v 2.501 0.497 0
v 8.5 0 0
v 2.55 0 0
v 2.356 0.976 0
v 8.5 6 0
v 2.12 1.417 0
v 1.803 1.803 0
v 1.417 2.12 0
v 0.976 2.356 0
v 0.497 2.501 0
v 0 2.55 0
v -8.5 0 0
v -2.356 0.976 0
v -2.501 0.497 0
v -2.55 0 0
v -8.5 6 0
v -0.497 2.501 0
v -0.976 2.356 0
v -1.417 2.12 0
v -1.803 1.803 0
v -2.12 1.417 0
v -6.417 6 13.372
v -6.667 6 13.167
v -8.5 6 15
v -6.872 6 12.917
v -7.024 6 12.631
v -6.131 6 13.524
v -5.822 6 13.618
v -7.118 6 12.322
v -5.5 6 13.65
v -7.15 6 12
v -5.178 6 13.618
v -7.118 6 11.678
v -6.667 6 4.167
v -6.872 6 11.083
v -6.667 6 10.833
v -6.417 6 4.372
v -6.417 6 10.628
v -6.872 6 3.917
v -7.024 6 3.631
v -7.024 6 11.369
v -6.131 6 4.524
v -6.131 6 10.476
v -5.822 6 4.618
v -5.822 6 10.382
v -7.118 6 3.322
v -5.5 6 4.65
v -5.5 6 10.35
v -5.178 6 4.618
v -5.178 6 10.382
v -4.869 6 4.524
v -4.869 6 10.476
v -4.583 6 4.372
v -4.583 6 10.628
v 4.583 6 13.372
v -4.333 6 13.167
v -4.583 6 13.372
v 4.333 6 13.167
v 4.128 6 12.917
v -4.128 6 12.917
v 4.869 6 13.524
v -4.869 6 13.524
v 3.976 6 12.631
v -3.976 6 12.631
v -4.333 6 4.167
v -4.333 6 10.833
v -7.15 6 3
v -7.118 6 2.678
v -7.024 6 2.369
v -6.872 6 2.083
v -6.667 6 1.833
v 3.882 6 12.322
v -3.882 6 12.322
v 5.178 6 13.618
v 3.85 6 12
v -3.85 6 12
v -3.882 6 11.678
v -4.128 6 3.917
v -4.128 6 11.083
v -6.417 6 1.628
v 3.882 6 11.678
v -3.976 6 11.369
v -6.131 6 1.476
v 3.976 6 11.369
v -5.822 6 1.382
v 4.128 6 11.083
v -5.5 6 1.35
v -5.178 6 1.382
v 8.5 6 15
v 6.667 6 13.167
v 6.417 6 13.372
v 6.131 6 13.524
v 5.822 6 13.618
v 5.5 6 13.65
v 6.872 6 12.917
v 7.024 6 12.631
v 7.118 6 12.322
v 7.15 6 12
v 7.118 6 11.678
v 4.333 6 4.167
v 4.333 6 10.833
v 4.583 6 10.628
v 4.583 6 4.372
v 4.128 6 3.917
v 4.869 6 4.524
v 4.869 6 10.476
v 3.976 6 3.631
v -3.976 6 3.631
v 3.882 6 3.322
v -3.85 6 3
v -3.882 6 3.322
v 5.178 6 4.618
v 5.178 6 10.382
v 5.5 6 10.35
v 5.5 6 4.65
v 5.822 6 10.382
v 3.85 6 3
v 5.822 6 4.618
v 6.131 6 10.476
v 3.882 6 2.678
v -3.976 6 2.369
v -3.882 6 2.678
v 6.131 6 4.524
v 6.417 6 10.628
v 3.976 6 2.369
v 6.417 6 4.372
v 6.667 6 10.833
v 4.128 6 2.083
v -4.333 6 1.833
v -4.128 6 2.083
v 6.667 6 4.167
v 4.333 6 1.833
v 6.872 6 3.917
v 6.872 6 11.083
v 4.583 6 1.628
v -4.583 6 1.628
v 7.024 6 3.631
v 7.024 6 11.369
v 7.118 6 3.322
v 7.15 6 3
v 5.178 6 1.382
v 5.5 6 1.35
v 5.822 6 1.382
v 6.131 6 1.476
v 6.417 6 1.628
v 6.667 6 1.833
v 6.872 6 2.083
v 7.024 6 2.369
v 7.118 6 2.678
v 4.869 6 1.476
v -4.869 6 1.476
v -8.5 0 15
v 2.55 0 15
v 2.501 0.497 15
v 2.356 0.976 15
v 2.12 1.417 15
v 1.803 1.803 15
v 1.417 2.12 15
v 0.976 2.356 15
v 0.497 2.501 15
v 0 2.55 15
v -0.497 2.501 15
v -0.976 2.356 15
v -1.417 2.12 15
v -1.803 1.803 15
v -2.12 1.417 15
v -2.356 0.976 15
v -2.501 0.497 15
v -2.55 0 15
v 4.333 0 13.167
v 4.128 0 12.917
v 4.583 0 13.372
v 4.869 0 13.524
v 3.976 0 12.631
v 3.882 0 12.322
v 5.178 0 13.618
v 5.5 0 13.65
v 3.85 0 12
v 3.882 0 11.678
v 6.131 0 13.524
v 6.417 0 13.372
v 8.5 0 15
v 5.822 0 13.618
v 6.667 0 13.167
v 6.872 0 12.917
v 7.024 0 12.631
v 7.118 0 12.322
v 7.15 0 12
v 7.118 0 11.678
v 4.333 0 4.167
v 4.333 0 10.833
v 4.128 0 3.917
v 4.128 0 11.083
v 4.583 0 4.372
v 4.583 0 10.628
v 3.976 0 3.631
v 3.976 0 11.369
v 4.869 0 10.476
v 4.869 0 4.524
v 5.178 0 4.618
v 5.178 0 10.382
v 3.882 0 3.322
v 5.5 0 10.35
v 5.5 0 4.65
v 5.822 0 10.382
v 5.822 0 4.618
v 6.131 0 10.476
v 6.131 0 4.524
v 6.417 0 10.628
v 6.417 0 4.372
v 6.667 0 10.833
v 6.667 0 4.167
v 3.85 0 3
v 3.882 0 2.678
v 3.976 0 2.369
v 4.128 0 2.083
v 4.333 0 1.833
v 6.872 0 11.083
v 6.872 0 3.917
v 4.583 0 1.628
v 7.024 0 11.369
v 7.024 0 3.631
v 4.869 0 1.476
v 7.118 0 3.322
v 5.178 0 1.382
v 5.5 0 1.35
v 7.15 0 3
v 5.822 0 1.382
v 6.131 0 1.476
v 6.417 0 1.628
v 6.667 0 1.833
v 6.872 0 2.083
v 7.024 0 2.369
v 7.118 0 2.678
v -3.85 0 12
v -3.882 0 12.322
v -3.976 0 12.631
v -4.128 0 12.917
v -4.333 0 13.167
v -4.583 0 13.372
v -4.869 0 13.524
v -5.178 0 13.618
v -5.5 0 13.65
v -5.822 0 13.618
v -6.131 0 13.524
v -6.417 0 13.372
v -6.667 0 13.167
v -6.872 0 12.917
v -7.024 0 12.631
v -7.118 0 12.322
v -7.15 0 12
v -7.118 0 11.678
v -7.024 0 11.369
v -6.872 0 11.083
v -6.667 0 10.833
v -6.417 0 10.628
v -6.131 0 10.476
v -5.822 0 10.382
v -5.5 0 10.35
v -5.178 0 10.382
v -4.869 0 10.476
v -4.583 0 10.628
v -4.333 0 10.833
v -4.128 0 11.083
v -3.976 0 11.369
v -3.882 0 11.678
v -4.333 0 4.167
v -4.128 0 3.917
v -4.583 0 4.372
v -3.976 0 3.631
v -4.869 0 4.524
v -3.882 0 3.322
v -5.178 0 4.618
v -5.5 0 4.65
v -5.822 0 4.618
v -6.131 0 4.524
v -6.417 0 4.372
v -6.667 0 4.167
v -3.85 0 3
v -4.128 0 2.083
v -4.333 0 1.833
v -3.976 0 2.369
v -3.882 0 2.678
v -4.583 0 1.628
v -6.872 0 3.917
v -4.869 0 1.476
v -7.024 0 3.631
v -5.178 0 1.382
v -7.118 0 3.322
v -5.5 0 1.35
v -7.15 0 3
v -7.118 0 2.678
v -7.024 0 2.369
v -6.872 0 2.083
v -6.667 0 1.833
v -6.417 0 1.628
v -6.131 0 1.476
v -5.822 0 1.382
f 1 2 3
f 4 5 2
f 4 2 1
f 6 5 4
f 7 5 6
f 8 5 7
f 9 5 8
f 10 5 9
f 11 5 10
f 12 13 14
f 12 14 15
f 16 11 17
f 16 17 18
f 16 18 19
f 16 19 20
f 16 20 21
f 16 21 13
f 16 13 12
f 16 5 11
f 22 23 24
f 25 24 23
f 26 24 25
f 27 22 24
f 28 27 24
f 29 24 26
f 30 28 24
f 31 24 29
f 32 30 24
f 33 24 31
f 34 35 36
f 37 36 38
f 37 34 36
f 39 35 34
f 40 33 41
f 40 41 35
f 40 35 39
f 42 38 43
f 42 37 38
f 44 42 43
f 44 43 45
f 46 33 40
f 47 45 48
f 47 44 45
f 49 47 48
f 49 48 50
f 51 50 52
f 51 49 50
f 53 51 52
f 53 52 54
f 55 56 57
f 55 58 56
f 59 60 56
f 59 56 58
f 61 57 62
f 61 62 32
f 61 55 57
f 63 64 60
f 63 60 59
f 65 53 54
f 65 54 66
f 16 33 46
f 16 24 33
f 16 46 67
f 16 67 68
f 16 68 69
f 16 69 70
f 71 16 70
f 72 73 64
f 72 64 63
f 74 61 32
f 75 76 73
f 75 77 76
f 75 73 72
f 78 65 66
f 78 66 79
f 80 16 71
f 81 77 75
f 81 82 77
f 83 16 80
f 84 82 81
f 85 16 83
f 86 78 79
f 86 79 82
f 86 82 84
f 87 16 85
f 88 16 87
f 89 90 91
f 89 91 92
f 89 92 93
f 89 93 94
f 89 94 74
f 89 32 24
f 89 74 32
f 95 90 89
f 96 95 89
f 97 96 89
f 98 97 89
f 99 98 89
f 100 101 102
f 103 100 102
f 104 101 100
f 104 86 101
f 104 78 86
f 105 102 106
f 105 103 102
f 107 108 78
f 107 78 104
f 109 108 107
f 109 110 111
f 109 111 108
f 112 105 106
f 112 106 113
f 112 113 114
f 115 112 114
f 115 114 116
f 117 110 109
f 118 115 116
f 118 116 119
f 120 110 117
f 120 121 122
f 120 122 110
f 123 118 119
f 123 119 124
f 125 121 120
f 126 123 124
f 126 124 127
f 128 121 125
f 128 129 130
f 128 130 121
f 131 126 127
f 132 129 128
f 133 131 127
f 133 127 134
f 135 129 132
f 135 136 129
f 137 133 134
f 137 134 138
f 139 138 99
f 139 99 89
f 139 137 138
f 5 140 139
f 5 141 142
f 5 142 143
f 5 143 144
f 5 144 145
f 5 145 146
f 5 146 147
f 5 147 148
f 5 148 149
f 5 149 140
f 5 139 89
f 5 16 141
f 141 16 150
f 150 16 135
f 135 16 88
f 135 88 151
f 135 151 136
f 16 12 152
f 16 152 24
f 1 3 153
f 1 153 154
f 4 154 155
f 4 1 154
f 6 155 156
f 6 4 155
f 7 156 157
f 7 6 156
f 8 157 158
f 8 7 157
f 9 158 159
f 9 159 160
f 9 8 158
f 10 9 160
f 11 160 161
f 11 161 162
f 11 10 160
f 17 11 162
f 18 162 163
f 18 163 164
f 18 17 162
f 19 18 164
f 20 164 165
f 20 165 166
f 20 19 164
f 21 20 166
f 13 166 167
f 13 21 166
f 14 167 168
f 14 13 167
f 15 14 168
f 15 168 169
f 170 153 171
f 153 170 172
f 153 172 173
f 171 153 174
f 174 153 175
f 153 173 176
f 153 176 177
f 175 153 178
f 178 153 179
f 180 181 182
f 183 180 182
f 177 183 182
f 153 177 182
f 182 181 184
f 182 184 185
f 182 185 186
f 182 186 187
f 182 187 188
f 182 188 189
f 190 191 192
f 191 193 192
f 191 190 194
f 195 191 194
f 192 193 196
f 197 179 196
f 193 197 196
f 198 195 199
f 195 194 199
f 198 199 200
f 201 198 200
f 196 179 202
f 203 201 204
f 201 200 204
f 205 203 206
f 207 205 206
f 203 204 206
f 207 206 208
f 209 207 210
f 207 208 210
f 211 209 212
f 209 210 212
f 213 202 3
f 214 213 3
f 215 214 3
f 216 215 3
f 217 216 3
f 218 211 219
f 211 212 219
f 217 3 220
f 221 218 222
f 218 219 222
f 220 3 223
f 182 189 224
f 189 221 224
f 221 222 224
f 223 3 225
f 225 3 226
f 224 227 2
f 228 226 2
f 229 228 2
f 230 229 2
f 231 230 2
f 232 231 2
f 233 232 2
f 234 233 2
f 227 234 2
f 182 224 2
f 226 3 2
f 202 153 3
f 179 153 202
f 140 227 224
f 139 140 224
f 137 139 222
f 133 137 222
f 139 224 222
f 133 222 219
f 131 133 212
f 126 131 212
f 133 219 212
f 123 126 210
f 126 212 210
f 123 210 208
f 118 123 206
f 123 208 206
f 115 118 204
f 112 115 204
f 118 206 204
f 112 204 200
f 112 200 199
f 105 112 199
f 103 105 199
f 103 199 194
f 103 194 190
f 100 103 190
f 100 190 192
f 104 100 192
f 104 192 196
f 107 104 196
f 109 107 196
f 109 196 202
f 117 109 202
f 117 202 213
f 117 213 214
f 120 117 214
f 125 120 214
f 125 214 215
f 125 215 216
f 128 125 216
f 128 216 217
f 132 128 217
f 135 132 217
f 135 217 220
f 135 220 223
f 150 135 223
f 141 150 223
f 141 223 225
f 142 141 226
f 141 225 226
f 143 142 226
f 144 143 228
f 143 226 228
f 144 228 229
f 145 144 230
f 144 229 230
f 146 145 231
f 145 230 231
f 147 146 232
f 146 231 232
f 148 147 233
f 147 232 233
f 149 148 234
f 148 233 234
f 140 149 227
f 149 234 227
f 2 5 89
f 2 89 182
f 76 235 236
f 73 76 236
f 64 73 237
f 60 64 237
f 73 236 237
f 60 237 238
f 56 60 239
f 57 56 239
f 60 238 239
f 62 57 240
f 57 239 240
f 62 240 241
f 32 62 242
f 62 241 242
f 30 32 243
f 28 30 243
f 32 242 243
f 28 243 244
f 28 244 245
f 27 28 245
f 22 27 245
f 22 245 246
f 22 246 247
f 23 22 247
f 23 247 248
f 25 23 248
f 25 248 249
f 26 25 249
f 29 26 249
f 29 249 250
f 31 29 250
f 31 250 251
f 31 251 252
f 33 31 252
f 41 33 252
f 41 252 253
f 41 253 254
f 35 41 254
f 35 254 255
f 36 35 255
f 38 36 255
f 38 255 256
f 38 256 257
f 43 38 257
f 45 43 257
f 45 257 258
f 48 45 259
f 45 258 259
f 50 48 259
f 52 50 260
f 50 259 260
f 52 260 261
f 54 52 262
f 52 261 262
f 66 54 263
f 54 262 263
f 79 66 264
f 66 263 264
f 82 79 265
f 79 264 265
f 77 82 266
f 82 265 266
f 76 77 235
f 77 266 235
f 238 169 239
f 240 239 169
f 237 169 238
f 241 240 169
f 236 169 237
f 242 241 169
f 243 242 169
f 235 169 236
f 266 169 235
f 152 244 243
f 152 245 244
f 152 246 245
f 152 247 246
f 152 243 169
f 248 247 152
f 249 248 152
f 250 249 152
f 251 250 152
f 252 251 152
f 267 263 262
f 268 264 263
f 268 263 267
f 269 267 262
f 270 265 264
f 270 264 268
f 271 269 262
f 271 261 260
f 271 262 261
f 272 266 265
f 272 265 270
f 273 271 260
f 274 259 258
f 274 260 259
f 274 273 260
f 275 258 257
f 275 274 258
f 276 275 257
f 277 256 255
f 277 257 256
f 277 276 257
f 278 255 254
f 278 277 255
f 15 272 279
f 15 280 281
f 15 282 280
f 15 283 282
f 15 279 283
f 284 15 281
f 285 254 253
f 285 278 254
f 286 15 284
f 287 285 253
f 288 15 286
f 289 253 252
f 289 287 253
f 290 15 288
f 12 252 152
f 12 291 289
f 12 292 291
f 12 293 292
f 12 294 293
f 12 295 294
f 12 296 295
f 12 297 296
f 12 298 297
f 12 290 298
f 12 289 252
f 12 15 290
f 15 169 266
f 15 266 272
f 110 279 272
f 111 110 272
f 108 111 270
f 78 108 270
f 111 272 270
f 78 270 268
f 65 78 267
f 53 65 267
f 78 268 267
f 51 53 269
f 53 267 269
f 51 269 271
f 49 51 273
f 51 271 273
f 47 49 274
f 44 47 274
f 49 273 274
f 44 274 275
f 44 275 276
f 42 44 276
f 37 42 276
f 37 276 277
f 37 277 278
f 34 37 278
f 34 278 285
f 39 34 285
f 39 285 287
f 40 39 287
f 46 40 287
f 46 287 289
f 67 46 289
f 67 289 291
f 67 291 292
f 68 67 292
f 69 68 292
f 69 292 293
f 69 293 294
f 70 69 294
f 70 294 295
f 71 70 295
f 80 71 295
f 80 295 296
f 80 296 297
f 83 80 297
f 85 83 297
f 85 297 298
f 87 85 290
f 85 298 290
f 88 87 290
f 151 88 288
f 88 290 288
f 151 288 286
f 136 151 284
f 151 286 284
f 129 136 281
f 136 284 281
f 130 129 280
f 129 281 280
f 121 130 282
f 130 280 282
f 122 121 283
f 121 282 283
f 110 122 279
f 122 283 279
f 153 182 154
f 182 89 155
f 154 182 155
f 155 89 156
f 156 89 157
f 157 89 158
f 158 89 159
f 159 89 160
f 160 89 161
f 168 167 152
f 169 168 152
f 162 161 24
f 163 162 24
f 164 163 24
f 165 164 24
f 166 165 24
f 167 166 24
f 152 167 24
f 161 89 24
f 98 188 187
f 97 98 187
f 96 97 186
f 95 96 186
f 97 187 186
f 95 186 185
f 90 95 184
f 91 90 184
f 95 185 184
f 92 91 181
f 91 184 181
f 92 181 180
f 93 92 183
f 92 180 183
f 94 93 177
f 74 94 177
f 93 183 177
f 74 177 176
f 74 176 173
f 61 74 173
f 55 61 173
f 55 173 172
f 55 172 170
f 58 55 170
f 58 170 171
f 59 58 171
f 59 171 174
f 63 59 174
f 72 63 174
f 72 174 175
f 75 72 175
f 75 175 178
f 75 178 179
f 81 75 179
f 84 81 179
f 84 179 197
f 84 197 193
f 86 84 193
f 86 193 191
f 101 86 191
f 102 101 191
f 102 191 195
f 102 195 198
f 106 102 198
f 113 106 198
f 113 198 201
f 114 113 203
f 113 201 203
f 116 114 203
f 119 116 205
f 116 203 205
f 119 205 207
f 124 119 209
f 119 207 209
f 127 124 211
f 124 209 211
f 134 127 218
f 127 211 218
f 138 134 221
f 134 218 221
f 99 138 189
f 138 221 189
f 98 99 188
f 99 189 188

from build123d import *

# Parameters (mm, degrees)
PAD_DEPTH    = 15
SKETCH001_R  = 1.65
POCKET_DEPTH = 6.001


with BuildPart() as part:
    # Sketch → Pad (new body)
    with BuildSketch(Plane.XY):
        with BuildLine():
            ThreePointArc((2.55, 0), (0, 2.55), (-2.55, 0))
            Line((-2.55, 0), (-8.5, 0))
            Line((-8.5, 0), (-8.5, 6))
            Line((-8.5, 6), (8.5, 6))
            Line((8.5, 6), (8.5, 0))
            Line((2.55, 0), (8.5, 0))
        make_face()
    extrude(amount=PAD_DEPTH)

    # Sketch001 → Pocket (cut, through all)
    with BuildSketch(Plane.XZ):
        with Locations((-5.5, 3)):
            Circle(SKETCH001_R)
        with Locations((-5.5, 12)):
            Circle(SKETCH001_R)
        with Locations((5.5, 12)):
            Circle(SKETCH001_R)
        with Locations((5.5, 3)):
            Circle(SKETCH001_R)
    extrude(amount=-POCKET_DEPTH, mode=Mode.SUBTRACT)


solid = part.part
